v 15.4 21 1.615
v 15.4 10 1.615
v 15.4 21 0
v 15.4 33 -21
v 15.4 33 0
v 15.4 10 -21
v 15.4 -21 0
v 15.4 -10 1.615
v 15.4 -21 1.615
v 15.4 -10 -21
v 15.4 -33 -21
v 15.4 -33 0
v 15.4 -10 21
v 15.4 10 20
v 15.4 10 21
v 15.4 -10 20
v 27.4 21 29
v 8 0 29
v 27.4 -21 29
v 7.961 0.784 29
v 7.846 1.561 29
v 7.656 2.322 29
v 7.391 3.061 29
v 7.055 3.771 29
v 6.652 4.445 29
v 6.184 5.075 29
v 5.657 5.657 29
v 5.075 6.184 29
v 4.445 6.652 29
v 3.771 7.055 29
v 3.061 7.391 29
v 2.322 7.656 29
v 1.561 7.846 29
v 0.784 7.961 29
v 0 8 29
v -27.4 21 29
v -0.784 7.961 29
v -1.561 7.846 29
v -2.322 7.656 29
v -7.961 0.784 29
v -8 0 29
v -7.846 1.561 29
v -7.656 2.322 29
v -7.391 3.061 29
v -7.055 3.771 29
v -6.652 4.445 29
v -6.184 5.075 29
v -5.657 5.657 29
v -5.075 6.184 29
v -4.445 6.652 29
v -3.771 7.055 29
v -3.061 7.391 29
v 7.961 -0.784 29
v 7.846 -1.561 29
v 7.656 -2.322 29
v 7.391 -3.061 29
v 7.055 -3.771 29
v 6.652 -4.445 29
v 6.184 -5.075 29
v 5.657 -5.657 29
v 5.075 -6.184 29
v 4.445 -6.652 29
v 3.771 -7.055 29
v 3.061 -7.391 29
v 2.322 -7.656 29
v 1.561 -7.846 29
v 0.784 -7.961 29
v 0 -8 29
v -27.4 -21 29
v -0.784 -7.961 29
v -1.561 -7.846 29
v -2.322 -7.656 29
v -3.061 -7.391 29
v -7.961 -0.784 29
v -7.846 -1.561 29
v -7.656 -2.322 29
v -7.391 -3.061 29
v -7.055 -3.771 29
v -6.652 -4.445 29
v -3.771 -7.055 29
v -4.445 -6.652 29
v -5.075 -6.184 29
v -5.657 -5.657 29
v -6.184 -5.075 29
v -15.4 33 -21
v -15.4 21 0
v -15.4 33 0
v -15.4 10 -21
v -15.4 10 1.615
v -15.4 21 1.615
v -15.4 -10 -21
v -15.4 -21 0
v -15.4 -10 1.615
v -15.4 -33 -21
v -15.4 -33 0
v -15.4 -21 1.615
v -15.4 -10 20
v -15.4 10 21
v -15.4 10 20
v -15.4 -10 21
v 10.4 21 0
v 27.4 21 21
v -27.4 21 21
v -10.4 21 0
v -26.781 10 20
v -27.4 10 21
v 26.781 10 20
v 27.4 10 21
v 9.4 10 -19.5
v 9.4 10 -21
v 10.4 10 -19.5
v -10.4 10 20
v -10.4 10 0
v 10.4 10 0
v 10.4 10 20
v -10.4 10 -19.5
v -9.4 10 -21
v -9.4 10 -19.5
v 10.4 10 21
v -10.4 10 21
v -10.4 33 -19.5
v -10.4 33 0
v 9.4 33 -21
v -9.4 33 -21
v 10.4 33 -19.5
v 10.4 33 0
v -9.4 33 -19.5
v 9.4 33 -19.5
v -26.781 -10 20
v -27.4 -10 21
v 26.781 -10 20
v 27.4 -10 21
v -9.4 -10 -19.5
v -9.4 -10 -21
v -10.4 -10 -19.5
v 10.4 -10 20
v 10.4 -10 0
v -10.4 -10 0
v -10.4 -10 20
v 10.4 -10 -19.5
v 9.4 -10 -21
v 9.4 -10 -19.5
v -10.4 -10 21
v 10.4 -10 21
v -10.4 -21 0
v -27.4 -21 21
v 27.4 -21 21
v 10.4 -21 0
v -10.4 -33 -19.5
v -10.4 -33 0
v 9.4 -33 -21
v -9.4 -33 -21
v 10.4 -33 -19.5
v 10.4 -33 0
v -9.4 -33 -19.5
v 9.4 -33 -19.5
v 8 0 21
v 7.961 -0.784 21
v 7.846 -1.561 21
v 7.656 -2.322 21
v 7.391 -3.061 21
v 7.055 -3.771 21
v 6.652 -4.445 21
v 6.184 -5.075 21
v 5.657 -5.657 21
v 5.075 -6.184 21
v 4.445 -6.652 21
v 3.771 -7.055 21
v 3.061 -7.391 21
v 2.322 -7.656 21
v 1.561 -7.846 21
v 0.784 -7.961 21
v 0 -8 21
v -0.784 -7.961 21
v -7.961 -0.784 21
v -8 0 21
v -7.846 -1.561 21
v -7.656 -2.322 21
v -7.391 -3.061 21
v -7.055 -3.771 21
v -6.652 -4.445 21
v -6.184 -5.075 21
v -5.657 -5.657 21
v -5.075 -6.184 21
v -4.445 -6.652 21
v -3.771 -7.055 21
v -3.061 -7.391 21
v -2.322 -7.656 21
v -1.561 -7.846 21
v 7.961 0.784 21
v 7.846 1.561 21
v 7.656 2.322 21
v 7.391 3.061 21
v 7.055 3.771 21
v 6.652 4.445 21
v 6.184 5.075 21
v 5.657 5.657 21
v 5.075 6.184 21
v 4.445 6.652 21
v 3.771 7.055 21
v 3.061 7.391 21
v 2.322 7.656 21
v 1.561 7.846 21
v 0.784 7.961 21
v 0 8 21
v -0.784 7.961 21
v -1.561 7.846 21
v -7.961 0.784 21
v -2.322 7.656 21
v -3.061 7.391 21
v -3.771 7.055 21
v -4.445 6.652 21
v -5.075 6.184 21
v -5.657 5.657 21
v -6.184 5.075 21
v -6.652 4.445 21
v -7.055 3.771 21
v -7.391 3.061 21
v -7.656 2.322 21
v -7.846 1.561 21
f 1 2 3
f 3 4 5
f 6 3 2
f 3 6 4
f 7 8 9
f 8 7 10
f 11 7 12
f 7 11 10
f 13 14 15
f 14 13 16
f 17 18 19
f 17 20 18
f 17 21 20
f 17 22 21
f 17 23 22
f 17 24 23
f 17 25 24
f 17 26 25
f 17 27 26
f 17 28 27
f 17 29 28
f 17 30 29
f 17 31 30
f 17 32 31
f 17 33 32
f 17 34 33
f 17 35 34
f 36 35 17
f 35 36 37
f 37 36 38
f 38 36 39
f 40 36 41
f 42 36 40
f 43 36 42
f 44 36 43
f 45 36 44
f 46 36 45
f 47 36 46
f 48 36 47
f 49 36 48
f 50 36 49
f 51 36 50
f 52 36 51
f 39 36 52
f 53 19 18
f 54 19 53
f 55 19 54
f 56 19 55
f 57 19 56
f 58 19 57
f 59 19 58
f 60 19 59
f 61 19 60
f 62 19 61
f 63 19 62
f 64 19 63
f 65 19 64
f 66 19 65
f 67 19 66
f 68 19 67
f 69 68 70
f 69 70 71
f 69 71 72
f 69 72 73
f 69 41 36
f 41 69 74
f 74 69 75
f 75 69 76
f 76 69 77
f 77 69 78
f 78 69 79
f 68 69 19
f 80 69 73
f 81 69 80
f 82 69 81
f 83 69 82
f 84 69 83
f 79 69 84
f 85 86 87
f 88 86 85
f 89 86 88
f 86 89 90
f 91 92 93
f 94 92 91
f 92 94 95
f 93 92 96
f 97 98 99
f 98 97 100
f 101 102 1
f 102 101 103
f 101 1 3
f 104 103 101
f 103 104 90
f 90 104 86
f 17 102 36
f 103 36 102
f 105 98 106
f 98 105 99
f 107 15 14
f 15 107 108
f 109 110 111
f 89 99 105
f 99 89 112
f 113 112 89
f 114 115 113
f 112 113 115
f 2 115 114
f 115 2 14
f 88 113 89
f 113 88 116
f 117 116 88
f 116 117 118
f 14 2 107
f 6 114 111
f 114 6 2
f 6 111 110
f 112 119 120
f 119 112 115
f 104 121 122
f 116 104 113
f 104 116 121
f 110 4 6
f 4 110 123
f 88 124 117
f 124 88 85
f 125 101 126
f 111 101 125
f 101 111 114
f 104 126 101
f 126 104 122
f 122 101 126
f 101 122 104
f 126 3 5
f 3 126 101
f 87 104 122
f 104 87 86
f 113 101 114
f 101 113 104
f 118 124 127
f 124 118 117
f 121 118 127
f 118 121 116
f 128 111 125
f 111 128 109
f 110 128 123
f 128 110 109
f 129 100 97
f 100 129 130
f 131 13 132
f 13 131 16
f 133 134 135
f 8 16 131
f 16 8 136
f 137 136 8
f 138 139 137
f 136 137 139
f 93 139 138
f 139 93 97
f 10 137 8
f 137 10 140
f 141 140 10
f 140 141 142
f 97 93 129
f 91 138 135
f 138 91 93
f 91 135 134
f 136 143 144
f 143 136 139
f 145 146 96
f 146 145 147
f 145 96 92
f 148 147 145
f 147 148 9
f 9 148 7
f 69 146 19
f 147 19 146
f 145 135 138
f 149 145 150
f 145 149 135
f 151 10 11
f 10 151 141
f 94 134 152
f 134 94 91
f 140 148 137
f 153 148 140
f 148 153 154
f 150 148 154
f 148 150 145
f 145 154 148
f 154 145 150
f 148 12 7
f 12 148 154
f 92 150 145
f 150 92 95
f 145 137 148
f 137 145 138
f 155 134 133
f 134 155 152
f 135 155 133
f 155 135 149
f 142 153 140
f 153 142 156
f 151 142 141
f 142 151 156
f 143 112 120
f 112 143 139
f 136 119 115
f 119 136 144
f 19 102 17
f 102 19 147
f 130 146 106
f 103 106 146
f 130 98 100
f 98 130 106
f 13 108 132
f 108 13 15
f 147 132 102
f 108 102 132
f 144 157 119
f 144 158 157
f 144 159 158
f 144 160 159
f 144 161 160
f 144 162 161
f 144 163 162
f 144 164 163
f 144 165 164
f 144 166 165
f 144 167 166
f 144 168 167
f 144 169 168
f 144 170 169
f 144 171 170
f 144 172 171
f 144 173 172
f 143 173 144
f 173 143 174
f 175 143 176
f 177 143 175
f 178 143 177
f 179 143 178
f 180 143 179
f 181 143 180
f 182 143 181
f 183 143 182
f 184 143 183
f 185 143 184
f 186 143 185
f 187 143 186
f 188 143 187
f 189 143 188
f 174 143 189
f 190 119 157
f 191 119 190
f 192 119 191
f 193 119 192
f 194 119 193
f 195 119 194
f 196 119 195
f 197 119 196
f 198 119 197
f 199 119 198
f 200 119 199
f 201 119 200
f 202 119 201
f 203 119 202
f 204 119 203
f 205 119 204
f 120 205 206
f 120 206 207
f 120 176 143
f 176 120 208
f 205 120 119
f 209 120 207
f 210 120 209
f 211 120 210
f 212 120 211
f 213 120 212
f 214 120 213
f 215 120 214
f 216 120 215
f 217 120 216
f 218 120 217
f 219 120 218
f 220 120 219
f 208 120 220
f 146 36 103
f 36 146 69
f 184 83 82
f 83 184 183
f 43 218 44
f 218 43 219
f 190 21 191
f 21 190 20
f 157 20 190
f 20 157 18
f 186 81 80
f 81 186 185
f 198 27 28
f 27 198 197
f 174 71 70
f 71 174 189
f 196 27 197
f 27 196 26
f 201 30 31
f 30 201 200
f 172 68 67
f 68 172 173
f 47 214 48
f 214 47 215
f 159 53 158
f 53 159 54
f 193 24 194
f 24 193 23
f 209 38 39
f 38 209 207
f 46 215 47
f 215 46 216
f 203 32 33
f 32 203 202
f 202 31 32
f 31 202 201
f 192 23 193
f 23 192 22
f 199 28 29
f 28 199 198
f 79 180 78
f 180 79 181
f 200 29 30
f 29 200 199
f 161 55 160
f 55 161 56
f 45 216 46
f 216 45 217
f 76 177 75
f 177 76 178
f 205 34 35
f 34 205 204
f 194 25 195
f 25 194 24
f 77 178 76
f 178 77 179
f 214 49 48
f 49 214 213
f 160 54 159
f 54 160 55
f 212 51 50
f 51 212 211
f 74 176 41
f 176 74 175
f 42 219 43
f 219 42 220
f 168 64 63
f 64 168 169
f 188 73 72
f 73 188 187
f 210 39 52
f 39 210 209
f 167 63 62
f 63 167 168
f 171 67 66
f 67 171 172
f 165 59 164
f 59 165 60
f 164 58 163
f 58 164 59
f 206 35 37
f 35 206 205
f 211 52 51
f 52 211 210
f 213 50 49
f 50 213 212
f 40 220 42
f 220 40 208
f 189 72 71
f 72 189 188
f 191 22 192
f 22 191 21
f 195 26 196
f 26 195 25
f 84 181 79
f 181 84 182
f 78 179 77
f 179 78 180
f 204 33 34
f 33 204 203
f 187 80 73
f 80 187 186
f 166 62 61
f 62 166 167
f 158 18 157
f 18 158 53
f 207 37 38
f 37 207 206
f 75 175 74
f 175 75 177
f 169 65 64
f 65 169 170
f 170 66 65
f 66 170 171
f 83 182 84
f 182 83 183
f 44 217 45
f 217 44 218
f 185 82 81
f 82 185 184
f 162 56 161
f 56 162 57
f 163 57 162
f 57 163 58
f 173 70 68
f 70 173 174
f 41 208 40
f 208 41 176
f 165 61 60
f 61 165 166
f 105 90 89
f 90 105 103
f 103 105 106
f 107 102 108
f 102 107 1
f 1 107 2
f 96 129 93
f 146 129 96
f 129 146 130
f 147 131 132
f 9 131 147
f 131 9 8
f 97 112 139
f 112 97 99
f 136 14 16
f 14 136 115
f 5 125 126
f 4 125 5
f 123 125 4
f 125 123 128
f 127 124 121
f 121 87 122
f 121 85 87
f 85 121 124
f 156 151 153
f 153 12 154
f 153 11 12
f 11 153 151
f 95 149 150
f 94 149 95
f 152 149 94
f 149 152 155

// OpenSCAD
// file: ../perpendicular-u-joint-guard-v1.3-triangular-corner-fills/candidate_triangular_corner_fills.scad
// Candidate v1.3: four triangular concave-corner fill blocks.
//
// Base: accepted v0.7 eaves12 geometry. v0.9/v1.0/v1.1/v1.2 are not
// imported. Each corner block is a real triangular prism: broad at the roof,
// tapering continuously toward z=0, and overlapping the U side wall.

use <../perpendicular-u-joint-guard-v0.7/perpendicular_double_u_guard.scad>;

$fn = 48;
PART = "candidate_iso";

// Explicit v0.7 interface values.
roof_x_outer = 27.4;       // accepted eaves12 roof: -27.4..+27.4
side_wall_x_outer = 15.4;  // existing side-wall outer edge
blue_tube_x_outer = 10.0;  // blue lower 20x20 tube half-width
plate_y_inner = 10.0;
plate_y_outer = 21.0;
plate_depth_y = plate_y_outer - plate_y_inner; // 11 mm per front/back U plate

// The top edge is 0.5 mm inside the roof volume (roof underside z=21), and
// the lower point enters the side wall by 1 mm in X.  The XZ area therefore
// has positive overlap at both ends, not edge-only contact.
triangle_top_z = 21.5;
triangle_bottom_z = 0.0;
triangle_roof_overlap_z = triangle_top_z - 21.0;
triangle_side_overlap_x = 1.0;
triangle_inner_x = side_wall_x_outer - triangle_side_overlap_x; // 14.4

// Bottom retaining-hook contract copied from v0.7 for explicit verification.
hook_height_z = 1.5;
u_bottom_z = -21.0;
hook_top_z = u_bottom_z + hook_height_z; // -19.5

assert(plate_depth_y == 11, "每个三角块的前后板深必须是 11 mm");
assert(triangle_top_z > 21 && triangle_bottom_z == 0,
       "三角块上端必须搭入屋檐、下端落到 z=0");
assert(triangle_inner_x > blue_tube_x_outer,
       "三角块下端不得进入蓝色方管 x=-10..+10 包络");
assert(triangle_side_overlap_x > 0 && triangle_roof_overlap_z > 0,
       "三角块必须与屋檐和侧墙都有正重叠");
assert(hook_height_z == 1.5 && u_bottom_z == -21 && hook_top_z == -19.5,
       "底部卡脚必须保持 z=-21..-19.5");

// A polygon in XZ is extruded only through the corresponding front/back U
// plate. The center y=-10..+10 passage remains open.
module triangular_fill_xz(points, yc) {
    translate([0, yc, 0])
        rotate([90, 0, 0])
            linear_extrude(height = plate_depth_y,
                           center = true,
                           convexity = 10)
                polygon(points = points);
}

module front_neg_x_triangle() {
    // -X roof end -> +X inward. Top wide, lower point at the side wall.
    triangular_fill_xz([
        [-roof_x_outer, 21.0],
        [-triangle_inner_x, triangle_top_z],
        [-triangle_inner_x, triangle_bottom_z]
    ], (plate_y_inner + plate_y_outer) / 2);
}

module front_pos_x_triangle() {
    // +X roof end -> -X inward. Mirrored triangle.
    triangular_fill_xz([
        [roof_x_outer, 21.0],
        [triangle_inner_x, triangle_top_z],
        [triangle_inner_x, triangle_bottom_z]
    ], (plate_y_inner + plate_y_outer) / 2);
}

module back_neg_x_triangle() {
    triangular_fill_xz([
        [-roof_x_outer, 21.0],
        [-triangle_inner_x, triangle_top_z],
        [-triangle_inner_x, triangle_bottom_z]
    ], -(plate_y_inner + plate_y_outer) / 2);
}

module back_pos_x_triangle() {
    triangular_fill_xz([
        [roof_x_outer, 21.0],
        [triangle_inner_x, triangle_top_z],
        [triangle_inner_x, triangle_bottom_z]
    ], -(plate_y_inner + plate_y_outer) / 2);
}

module front_two_triangular_fills() {
    union() {
        front_neg_x_triangle();
        front_pos_x_triangle();
    }
}

module back_two_triangular_fills() {
    union() {
        back_neg_x_triangle();
        back_pos_x_triangle();
    }
}

module all_four_triangular_fills() {
    union() {
        front_two_triangular_fills();
        back_two_triangular_fills();
    }
}

module candidate_print_solid() {
    // Final hole operation is deliberately after the complete four-block
    // union; this preserves a true Z through-hole and the round nut pocket.
    difference() {
        union() {
            double_u_clip();
            all_four_triangular_fills();
        }
        vertical_screw_relief();
    }
}

module candidate_clip() {
    candidate_print_solid();
}

module candidate_assembly_iso() {
    upper_long_tube();
    lower_cross_tube();
    color([0.96, 0.39, 0.08]) double_u_clip();
    color([0.86, 0.13, 0.08]) front_two_triangular_fills();
    color([0.62, 0.12, 0.52]) back_two_triangular_fills();
    vertical_joint_screw();
}

module candidate_front_xz() {
    lower_cross_tube();
    color([0.96, 0.39, 0.08]) double_u_clip();
    color([0.86, 0.13, 0.08]) front_two_triangular_fills();
    vertical_joint_screw();
}

module candidate_back_xz() {
    lower_cross_tube();
    color([0.96, 0.39, 0.08]) double_u_clip();
    color([0.62, 0.12, 0.52]) back_two_triangular_fills();
    vertical_joint_screw();
}

module candidate_top_slice() {
    // At z=-0.5..2.5 the four blocks show their two front/back 11 mm bands;
    // the blue tube and the central y gap remain visible.
    slice_box = 200;
    color([0.28, 0.45, 0.78])
        intersection() {
            lower_cross_tube();
            translate([-slice_box / 2, -slice_box / 2, -0.5])
                cube([slice_box, slice_box, 3.0]);
        }
    color([0.96, 0.39, 0.08])
        intersection() {
            double_u_clip();
            translate([-slice_box / 2, -slice_box / 2, -0.5])
                cube([slice_box, slice_box, 3.0]);
        }
    color([0.86, 0.13, 0.08])
        intersection() {
            front_two_triangular_fills();
            translate([-slice_box / 2, -slice_box / 2, -0.5])
                cube([slice_box, slice_box, 3.0]);
        }
    color([0.62, 0.12, 0.52])
        intersection() {
            back_two_triangular_fills();
            translate([-slice_box / 2, -slice_box / 2, -0.5])
                cube([slice_box, slice_box, 3.0]);
        }
}

module candidate_hole_section() {
    // Center y=0 section: the bore and round nut pocket are shown without
    // confusing them with the bottom hook, which is outside this section.
    intersection() {
        candidate_print_solid();
        translate([-100, -0.4, -100]) cube([200, 0.8, 200]);
    }
}

module candidate_hook_check() {
    // Isolated lower detail: exact imported v0.7 U plate and blue tube, with
    // hook volumes highlighted only for review. This is not the print union.
    detail_box = 200;
    detail_z0 = -22;
    detail_h = 5;
    detail_y0 = 8;
    detail_ydepth = 15;
    intersection() {
        lower_cross_tube();
        translate([-detail_box / 2, detail_y0, detail_z0])
            cube([detail_box, detail_ydepth, detail_h]);
    }
    color([0.96, 0.39, 0.08])
        intersection() {
            u_plate(plate_y_inner, plate_y_outer);
            translate([-detail_box / 2, detail_y0, detail_z0])
                cube([detail_box, detail_ydepth, detail_h]);
        }
    color([0.20, 0.78, 0.20])
        intersection() {
            union() {
                translate([-13.65, 15.5, -20.25])
                    cube([3.5, 11, 1.5], center = true);
                translate([13.65, 15.5, -20.25])
                    cube([3.5, 11, 1.5], center = true);
            }
            translate([-detail_box / 2, detail_y0, detail_z0])
                cube([detail_box, detail_ydepth, detail_h]);
        }
}

if (PART == "candidate_clip") {
    candidate_clip();
} else if (PART == "candidate_front_xz") {
    candidate_front_xz();
} else if (PART == "candidate_back_xz") {
    candidate_back_xz();
} else if (PART == "candidate_top_slice") {
    candidate_top_slice();
} else if (PART == "candidate_hole_section") {
    candidate_hole_section();
} else if (PART == "candidate_hook_check") {
    candidate_hook_check();
} else {
    candidate_assembly_iso();
}
// file: ../perpendicular-u-joint-guard-v1.4-full-nut-passage/full_nut_passage_guard.scad
// v1.4: keep the exact v1.3 body; remove the nut-pocket floor with one
// full-depth Ø16 cylindrical subtraction. Units: mm; Z positive upwards.
// Imported v1.3 geometry contains all four triangles and the lower hooks.
use <../perpendicular-u-joint-guard-v1.3-triangular-corner-fills/candidate_triangular_corner_fills.scad>;

$fn = 48;
PART = "clip";
nut_passage_d = 16.0;

module full_depth_nut_passage() {
    // Cutter extends z=-31..39, past the whole printed z=-21..29 envelope.
    // 64 facets match the existing Ø16 pocket, avoiding a stepped profile.
    translate([0, 0, 4])
        cylinder(d = nut_passage_d, h = 70, center = true, $fn = 64);
}

module guard_v1_4() {
    difference() {
        candidate_print_solid();
        full_depth_nut_passage();
    }
}

guard_v1_4();
// file: ../perpendicular-u-joint-guard-v1.5-vertical-tube-clearance/vertical_tube_clearance_guard.scad
// v1.5: v1.4 Ø16 full nut passage + minimum downward-entry upper-tube slot.
// Units mm. X: upper long tube; Y: blue foot/front-back; Z: up.
use <../perpendicular-u-joint-guard-v1.4-full-nut-passage/full_nut_passage_guard.scad>;

$fn = 48;

module upper_pipe_vertical_entry_slot() {
    // Fixed gray upper tube: x=-60..60, y=-10..10, z=0..20.
    // While the clip moves down, that tube sweeps upward in clip coordinates.
    // A bottom-open slot ending at z=20 covers its whole relevant sweep in
    // the printed z=-21..29 envelope. Roof underside remains at z=21.
    // Preserve exact 20 mm Y width rather than silently adding fit clearance.
    translate([-60, -10, -31]) cube([120, 20, 51]);
}

module guard_v1_5() {
    difference() {
        guard_v1_4();
        upper_pipe_vertical_entry_slot();
    }
}

guard_v1_5();
// main file
// v1.6 candidate, mm. Extend only the lower U arms and retaining hooks.
// Interpretation of 'from the bottom upwards': z=-21..0 (blue foot top).
// Front outer face +21 -> +33; rear outer face -21 -> -33, 12 mm each.
// The v1.5 body, triangle XZ profiles and existing snap hooks are inherited.
use <../perpendicular-u-joint-guard-v1.5-vertical-tube-clearance/vertical_tube_clearance_guard.scad>;
use <../perpendicular-u-joint-guard-v1.4-full-nut-passage/full_nut_passage_guard.scad>;
use <../perpendicular-u-joint-guard-v0.7/perpendicular_double_u_guard.scad>;

$fn = 48;
y_outward_extension = 12;
lower_extension_bottom_z = -21;
lower_extension_top_z = 0;
extension_joint_overlap = 0.1;

module lower_extension_band(y0, y1) {
    // Reuse the real v0.7 U cross-section, including its 1.5 mm hook.
    // Clipping to z<=0 excludes the upper web, roof and corner triangles.
    intersection() {
        u_plate(y0, y1);
        translate([-40, -50, lower_extension_bottom_z])
            cube([80, 100, lower_extension_top_z - lower_extension_bottom_z]);
    }
}

module lower_y_extensions() {
    lower_extension_band(21 - extension_joint_overlap, 21 + y_outward_extension);
    lower_extension_band(-21 - y_outward_extension, -21 + extension_joint_overlap);
}

module guard_v1_6() {
    difference() {
        union() {
            guard_v1_5();
            lower_y_extensions();
        }
        // Final operations keep the accepted full-depth nut passage and the
        // v1.5 rigid upper-tube entry clearance authoritative.
        full_depth_nut_passage();
        upper_pipe_vertical_entry_slot();
    }
}

guard_v1_6();
